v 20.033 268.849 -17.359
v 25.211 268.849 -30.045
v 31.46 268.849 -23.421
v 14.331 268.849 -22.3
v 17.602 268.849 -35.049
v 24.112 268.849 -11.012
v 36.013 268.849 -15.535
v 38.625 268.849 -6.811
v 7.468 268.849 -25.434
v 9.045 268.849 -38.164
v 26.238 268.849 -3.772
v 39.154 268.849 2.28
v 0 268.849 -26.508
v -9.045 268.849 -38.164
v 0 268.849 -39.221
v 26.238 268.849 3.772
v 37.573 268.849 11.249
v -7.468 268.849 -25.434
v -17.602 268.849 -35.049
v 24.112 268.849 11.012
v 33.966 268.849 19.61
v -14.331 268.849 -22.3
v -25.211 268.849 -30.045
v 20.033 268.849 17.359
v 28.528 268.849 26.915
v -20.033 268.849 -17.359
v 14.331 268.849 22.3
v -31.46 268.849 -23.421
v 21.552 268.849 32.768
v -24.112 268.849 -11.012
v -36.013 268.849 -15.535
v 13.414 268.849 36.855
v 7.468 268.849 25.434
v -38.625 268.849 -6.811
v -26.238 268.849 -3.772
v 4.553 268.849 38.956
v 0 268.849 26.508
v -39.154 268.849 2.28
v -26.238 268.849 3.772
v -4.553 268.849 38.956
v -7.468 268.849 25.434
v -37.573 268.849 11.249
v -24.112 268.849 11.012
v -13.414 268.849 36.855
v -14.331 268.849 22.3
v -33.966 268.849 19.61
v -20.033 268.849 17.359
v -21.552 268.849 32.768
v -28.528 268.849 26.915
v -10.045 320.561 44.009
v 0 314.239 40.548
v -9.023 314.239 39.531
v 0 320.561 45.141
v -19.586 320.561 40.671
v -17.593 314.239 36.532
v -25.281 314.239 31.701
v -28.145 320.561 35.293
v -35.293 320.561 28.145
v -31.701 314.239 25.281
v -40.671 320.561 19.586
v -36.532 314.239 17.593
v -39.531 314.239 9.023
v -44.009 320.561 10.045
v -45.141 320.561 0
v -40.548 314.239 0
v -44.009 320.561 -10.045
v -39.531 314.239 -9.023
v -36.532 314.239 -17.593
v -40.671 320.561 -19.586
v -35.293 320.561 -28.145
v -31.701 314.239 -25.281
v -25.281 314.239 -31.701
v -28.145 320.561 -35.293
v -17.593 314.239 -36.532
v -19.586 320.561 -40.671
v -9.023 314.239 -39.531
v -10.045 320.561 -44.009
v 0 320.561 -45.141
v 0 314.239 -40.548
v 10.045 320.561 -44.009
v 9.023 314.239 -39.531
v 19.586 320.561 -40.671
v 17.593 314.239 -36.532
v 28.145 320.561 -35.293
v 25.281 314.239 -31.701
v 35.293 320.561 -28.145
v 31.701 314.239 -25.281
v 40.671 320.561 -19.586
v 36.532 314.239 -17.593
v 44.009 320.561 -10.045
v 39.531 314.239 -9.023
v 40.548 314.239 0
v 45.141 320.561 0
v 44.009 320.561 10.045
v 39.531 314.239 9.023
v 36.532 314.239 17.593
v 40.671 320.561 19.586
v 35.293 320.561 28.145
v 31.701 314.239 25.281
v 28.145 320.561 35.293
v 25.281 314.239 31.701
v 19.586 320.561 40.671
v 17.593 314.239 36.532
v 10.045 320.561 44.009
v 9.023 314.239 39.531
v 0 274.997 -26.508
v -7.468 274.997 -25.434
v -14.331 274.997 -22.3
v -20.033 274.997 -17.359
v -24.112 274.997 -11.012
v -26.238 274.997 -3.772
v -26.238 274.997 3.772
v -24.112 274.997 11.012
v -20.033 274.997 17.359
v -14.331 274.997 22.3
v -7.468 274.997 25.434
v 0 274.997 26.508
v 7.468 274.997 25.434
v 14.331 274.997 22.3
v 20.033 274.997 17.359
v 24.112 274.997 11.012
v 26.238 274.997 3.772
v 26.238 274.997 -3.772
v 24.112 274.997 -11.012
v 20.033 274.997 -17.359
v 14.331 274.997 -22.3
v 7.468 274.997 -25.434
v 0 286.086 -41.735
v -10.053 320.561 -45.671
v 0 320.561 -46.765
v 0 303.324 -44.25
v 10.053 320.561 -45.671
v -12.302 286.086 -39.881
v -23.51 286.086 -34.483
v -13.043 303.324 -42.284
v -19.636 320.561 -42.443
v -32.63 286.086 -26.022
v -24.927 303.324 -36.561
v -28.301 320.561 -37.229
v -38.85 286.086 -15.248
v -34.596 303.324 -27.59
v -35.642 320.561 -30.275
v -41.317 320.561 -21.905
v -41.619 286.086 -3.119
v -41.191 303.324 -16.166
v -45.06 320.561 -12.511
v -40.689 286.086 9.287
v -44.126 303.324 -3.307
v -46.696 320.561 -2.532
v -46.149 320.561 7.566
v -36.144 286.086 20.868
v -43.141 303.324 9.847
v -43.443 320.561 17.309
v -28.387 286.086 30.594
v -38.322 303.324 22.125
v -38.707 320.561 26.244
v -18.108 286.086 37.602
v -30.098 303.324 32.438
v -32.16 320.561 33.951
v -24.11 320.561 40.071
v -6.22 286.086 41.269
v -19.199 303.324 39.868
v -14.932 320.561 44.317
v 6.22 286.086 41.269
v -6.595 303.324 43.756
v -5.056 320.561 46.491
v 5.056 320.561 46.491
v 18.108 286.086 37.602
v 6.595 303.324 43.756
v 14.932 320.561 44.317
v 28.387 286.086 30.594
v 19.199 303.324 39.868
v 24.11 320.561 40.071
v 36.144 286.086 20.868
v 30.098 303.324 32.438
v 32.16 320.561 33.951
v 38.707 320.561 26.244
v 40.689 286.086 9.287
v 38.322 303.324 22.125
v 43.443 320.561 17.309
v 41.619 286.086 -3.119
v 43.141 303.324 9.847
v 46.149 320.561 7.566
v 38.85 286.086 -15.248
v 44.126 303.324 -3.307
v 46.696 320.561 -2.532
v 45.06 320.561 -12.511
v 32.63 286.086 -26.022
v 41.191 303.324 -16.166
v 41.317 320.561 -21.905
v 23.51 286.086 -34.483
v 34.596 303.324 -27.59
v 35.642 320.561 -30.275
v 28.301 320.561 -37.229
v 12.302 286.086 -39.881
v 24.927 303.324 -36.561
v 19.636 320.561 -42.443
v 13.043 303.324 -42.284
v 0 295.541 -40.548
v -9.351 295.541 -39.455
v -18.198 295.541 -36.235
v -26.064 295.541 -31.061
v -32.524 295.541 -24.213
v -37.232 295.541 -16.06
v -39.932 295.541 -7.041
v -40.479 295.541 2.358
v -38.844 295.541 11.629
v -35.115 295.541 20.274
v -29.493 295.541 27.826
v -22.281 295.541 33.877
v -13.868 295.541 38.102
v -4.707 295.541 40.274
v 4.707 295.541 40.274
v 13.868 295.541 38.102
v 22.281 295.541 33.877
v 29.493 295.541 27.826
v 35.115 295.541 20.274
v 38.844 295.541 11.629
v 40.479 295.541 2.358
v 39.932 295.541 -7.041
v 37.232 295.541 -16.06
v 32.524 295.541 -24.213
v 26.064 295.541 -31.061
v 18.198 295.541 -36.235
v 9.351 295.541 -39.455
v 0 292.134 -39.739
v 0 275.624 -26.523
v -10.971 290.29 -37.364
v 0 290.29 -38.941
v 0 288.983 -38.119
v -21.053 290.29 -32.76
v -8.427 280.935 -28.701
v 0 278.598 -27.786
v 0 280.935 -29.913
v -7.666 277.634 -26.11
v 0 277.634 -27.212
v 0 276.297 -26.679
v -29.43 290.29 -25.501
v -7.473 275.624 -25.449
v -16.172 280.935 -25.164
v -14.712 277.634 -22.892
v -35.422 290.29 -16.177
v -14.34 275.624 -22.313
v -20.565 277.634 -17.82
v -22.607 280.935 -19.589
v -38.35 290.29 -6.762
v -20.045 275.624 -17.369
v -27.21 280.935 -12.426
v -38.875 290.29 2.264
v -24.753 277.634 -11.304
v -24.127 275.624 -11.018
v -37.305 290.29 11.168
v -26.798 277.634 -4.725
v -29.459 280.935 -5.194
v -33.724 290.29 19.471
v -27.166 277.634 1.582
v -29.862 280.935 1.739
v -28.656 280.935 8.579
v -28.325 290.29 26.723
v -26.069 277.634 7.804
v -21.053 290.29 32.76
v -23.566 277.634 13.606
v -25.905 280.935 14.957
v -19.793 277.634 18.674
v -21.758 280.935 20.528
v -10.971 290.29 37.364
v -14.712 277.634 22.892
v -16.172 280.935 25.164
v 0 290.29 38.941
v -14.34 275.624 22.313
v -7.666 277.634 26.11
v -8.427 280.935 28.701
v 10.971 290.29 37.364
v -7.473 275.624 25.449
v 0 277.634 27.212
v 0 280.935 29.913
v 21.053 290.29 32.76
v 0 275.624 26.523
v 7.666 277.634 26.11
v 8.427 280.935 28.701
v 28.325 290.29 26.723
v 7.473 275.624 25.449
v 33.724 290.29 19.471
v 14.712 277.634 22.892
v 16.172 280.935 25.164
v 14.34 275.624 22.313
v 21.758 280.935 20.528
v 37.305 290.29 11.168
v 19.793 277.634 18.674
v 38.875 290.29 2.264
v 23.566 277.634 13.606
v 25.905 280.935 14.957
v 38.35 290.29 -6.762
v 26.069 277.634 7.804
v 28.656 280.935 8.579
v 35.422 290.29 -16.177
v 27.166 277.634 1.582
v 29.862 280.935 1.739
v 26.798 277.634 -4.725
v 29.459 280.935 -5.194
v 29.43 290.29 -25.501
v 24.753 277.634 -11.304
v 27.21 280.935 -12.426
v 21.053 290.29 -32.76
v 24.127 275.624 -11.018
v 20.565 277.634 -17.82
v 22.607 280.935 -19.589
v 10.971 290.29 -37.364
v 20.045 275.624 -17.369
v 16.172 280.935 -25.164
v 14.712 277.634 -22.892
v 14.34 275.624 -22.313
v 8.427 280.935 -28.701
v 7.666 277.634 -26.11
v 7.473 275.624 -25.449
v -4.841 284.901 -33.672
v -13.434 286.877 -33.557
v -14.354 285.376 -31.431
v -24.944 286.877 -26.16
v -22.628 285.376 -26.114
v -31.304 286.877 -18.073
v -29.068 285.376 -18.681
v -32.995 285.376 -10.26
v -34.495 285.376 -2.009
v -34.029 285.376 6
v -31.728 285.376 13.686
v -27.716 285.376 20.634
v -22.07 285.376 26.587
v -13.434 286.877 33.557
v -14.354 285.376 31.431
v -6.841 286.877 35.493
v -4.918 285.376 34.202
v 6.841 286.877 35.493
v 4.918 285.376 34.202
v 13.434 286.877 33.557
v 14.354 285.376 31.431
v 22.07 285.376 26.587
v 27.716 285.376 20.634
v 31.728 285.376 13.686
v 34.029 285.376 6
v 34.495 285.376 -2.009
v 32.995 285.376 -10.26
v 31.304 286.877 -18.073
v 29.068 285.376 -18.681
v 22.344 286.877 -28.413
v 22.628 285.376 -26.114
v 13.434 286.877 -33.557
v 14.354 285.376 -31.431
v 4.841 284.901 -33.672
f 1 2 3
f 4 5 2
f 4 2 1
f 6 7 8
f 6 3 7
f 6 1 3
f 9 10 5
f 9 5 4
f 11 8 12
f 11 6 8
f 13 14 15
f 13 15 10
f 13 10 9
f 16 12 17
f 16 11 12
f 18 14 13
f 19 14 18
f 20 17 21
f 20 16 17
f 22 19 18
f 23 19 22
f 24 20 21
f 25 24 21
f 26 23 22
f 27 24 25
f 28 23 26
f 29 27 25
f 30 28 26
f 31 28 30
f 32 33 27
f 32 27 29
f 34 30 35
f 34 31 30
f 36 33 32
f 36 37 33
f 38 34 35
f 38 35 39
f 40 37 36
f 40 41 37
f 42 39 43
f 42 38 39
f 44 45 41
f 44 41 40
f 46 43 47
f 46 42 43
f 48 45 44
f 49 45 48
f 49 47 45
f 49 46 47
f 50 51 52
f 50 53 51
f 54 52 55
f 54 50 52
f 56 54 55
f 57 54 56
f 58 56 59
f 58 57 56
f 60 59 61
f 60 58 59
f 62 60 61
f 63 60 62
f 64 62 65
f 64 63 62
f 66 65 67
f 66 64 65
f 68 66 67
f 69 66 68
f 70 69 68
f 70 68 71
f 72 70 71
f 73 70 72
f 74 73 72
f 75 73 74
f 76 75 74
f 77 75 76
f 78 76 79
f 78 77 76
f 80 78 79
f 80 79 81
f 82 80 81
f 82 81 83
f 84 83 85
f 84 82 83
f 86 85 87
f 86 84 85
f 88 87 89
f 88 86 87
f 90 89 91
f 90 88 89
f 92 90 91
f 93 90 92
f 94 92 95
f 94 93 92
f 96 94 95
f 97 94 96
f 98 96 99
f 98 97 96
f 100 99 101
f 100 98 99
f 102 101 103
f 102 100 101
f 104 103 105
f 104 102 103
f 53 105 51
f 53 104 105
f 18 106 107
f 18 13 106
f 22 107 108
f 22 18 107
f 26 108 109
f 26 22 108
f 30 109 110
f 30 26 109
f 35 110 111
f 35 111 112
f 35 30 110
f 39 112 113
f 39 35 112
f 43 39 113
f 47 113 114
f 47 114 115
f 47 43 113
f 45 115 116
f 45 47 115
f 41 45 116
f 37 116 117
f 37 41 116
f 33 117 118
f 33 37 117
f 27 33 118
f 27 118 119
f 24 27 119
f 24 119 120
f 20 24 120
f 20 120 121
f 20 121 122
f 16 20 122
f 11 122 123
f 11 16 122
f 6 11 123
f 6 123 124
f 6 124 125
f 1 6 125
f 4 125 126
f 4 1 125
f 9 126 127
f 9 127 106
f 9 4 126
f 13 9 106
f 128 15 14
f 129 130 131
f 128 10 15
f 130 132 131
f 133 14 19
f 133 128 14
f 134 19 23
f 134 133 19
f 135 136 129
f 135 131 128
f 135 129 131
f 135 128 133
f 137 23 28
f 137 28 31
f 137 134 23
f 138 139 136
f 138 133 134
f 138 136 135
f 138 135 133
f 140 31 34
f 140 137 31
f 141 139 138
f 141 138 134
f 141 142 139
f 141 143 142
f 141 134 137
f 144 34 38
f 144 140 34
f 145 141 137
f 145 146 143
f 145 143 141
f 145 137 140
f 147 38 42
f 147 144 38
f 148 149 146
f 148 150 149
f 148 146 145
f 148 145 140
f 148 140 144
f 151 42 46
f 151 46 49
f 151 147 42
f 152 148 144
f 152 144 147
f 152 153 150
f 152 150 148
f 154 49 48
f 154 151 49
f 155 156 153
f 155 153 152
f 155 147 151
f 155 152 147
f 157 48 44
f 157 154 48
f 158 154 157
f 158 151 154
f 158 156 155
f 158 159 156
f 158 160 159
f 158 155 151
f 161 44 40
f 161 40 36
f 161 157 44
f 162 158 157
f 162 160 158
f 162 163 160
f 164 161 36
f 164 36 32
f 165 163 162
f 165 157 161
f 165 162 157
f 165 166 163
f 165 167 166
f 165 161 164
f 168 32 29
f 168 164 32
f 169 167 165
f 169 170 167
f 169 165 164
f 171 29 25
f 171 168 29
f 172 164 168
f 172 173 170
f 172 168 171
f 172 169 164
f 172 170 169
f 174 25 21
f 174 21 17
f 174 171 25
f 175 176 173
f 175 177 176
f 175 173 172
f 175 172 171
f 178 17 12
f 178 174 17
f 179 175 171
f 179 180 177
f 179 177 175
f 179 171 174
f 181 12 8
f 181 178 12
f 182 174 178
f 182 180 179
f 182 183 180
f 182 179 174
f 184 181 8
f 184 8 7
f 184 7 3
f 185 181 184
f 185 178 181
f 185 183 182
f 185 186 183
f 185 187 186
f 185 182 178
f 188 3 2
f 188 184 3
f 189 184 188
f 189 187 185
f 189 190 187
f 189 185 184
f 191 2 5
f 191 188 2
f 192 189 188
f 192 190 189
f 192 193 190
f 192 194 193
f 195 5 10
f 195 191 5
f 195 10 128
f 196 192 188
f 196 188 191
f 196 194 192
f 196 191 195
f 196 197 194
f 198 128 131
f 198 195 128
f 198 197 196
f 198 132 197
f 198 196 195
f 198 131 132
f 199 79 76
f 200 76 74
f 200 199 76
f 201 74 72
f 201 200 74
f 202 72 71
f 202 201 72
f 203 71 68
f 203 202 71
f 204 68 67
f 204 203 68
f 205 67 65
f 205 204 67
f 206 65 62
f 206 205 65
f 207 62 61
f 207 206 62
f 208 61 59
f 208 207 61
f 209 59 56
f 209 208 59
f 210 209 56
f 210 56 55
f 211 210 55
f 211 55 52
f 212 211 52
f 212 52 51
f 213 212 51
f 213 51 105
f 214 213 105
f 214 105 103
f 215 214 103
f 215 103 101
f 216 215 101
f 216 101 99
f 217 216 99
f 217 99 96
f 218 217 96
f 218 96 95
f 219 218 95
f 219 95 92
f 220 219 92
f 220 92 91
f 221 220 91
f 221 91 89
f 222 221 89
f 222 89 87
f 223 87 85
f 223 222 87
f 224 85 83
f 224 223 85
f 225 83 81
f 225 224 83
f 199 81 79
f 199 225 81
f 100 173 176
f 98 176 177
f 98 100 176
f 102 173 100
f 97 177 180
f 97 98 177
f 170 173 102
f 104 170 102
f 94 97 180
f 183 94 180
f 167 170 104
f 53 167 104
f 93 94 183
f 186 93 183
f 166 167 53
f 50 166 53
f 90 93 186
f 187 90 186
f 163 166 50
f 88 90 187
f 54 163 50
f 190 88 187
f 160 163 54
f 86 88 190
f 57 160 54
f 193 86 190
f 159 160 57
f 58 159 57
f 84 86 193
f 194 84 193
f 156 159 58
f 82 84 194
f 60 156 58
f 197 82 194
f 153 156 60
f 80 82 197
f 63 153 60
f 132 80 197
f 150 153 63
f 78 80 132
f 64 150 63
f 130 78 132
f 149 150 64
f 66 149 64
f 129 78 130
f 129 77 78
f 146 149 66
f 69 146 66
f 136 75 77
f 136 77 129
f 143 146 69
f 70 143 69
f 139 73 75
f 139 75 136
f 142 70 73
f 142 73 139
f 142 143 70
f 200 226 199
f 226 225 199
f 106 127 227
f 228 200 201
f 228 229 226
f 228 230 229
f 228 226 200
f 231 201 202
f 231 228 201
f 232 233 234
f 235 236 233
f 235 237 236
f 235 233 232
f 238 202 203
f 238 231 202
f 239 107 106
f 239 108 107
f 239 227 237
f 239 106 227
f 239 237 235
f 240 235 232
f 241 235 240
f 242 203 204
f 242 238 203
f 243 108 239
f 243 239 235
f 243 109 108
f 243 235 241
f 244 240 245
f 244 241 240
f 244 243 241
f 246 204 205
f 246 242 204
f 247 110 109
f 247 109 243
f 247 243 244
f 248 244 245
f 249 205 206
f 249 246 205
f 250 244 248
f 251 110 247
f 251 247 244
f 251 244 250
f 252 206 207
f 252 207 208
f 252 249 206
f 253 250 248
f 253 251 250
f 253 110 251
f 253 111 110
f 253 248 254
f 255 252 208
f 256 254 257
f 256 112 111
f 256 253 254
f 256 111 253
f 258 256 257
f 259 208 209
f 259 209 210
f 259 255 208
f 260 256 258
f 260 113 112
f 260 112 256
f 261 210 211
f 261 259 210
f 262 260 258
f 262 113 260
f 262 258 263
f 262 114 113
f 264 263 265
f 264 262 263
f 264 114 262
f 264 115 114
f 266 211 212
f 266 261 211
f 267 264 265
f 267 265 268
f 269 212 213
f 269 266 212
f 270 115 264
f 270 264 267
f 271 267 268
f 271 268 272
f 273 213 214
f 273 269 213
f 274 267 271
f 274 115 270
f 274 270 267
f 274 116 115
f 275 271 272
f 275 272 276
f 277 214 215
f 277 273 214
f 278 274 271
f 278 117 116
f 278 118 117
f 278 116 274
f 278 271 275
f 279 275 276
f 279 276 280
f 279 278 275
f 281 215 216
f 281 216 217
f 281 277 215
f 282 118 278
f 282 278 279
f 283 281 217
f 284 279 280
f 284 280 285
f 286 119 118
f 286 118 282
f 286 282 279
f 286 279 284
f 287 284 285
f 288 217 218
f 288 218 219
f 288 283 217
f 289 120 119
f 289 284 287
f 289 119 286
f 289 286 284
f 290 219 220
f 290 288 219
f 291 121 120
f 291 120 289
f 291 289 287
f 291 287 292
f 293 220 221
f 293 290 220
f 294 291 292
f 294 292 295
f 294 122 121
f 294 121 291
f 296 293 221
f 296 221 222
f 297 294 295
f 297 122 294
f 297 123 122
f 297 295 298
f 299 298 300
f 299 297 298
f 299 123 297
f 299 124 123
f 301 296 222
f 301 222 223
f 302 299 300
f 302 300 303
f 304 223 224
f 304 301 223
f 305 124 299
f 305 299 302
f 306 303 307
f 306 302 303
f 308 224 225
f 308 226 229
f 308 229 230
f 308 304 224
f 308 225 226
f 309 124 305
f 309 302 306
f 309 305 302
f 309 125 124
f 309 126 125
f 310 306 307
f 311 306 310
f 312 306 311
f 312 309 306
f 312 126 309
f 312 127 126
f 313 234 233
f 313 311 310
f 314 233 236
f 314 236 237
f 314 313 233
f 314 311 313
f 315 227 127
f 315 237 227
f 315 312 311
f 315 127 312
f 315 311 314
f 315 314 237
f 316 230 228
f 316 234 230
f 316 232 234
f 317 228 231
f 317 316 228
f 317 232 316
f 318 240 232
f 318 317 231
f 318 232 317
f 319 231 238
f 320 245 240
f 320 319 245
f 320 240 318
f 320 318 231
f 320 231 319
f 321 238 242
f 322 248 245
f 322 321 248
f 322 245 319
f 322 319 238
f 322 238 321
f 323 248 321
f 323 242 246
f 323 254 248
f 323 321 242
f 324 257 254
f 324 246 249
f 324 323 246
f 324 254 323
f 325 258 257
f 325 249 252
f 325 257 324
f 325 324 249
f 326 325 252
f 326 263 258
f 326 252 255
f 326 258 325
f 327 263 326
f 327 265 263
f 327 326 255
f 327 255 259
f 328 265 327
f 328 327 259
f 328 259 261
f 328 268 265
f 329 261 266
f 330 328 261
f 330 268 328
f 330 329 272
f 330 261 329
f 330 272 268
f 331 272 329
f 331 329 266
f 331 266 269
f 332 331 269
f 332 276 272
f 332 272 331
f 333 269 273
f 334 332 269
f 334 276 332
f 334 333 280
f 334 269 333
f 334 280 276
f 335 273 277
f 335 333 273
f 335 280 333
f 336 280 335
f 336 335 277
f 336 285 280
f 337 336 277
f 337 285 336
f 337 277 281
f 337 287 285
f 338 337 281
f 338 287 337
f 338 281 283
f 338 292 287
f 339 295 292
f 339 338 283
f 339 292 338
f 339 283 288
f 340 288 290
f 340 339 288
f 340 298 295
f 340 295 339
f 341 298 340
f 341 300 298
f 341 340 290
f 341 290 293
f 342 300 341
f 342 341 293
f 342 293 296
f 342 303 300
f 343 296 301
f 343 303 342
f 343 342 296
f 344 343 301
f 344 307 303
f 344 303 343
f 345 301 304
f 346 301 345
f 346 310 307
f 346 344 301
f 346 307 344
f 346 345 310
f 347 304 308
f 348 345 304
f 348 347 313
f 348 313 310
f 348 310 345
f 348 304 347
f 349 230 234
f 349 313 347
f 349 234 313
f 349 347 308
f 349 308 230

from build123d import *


with BuildPart() as part:
    # Sketch2 → Revolve6 (revolve)
    with BuildSketch(Plane(origin=(0, 0, 0), x_dir=(0, 0, -1), z_dir=(1, 0, 0))):
        with BuildLine():
            Line((26.5077562, 274.996982717), (26.5077562, 268.848618941))
            Line((26.5077562, 268.848618941), (39.220771913, 268.848618941))
            Line((39.220771913, 268.848618941), (46.76480408, 320.561079728))
            Line((46.76480408, 320.561079728), (44.197949192, 320.561079728))
            Line((44.197949192, 320.561079728), (40.547674755, 314.238618941))
            Line((40.547674755, 314.238618941), (40.547674755, 295.540718442))
            add(Edge.make_bspline(
                [(40.547674755, 295.540718442), (40.447740466, 295.01270962), (40.292777353, 293.970757622), (39.930889756, 292.587532756), (39.516186417, 291.581451362), (39.108370784, 290.578047283), (38.439698056, 289.316986821), (37.331416088, 288.032583081), (36.368363883, 287.115418475), (35.630231266, 286.340079674), (35.016472728, 285.762737127), (34.394259797, 285.247169225), (33.635524663, 284.556558001), (32.920361335, 283.771384039), (32.129651902, 282.986073937), (31.485241785, 282.459482324), (30.914997209, 281.963476574), (30.371700347, 281.39129816), (29.78279616, 280.804626851), (29.227584582, 280.262154529), (28.724752619, 279.674853682), (28.180386254, 279.039651716), (27.651838316, 278.470209992), (27.308145936, 277.876839187), (26.995230081, 277.127164256), (26.597952618, 276.164510632), (26.464811583, 275.470548141), (26.5077562, 274.996982717)],
                knots=[0, 0, 0, 0, 0.062544048, 0.125088096, 0.156360121, 0.187632145, 0.250176193, 0.312720241, 0.375264289, 0.406536313, 0.437808337, 0.469080362, 0.500352386, 0.562896434, 0.594168458, 0.625440482, 0.656712506, 0.68798453, 0.719256554, 0.750528579, 0.781800603, 0.813072627, 0.844344651, 0.875616675, 0.906888699, 0.938160723, 1.000704771, 1.000704771, 1.000704771, 1.000704771], degree=3))
        make_face()
    revolve(axis=Axis((0, 0, 0), (0, 1, 0)))

    # Sketch3 → Cut-Revolve1 (revolve, cut)
    with BuildSketch(Plane(origin=(0, 0, 0), x_dir=(0, 0, -1), z_dir=(1, 0, 0)), mode=Mode.PRIVATE) as cut_revolve1_sk:
        Polygon((40.547674755, 314.238618941), (54.812040554, 333.871834134), (54.812040554, 347.836976562), (0, 347.836976562), (0, 311.675114189), (40.547674755, 311.675114189), align=None)
    revolve(cut_revolve1_sk.sketch.rotate(Axis((0, 347.836976562, 0), (0, -1, 0)), 180), axis=Axis((0, 347.836976562, 0), (0, -1, 0)), mode=Mode.SUBTRACT)


solid = part.part
